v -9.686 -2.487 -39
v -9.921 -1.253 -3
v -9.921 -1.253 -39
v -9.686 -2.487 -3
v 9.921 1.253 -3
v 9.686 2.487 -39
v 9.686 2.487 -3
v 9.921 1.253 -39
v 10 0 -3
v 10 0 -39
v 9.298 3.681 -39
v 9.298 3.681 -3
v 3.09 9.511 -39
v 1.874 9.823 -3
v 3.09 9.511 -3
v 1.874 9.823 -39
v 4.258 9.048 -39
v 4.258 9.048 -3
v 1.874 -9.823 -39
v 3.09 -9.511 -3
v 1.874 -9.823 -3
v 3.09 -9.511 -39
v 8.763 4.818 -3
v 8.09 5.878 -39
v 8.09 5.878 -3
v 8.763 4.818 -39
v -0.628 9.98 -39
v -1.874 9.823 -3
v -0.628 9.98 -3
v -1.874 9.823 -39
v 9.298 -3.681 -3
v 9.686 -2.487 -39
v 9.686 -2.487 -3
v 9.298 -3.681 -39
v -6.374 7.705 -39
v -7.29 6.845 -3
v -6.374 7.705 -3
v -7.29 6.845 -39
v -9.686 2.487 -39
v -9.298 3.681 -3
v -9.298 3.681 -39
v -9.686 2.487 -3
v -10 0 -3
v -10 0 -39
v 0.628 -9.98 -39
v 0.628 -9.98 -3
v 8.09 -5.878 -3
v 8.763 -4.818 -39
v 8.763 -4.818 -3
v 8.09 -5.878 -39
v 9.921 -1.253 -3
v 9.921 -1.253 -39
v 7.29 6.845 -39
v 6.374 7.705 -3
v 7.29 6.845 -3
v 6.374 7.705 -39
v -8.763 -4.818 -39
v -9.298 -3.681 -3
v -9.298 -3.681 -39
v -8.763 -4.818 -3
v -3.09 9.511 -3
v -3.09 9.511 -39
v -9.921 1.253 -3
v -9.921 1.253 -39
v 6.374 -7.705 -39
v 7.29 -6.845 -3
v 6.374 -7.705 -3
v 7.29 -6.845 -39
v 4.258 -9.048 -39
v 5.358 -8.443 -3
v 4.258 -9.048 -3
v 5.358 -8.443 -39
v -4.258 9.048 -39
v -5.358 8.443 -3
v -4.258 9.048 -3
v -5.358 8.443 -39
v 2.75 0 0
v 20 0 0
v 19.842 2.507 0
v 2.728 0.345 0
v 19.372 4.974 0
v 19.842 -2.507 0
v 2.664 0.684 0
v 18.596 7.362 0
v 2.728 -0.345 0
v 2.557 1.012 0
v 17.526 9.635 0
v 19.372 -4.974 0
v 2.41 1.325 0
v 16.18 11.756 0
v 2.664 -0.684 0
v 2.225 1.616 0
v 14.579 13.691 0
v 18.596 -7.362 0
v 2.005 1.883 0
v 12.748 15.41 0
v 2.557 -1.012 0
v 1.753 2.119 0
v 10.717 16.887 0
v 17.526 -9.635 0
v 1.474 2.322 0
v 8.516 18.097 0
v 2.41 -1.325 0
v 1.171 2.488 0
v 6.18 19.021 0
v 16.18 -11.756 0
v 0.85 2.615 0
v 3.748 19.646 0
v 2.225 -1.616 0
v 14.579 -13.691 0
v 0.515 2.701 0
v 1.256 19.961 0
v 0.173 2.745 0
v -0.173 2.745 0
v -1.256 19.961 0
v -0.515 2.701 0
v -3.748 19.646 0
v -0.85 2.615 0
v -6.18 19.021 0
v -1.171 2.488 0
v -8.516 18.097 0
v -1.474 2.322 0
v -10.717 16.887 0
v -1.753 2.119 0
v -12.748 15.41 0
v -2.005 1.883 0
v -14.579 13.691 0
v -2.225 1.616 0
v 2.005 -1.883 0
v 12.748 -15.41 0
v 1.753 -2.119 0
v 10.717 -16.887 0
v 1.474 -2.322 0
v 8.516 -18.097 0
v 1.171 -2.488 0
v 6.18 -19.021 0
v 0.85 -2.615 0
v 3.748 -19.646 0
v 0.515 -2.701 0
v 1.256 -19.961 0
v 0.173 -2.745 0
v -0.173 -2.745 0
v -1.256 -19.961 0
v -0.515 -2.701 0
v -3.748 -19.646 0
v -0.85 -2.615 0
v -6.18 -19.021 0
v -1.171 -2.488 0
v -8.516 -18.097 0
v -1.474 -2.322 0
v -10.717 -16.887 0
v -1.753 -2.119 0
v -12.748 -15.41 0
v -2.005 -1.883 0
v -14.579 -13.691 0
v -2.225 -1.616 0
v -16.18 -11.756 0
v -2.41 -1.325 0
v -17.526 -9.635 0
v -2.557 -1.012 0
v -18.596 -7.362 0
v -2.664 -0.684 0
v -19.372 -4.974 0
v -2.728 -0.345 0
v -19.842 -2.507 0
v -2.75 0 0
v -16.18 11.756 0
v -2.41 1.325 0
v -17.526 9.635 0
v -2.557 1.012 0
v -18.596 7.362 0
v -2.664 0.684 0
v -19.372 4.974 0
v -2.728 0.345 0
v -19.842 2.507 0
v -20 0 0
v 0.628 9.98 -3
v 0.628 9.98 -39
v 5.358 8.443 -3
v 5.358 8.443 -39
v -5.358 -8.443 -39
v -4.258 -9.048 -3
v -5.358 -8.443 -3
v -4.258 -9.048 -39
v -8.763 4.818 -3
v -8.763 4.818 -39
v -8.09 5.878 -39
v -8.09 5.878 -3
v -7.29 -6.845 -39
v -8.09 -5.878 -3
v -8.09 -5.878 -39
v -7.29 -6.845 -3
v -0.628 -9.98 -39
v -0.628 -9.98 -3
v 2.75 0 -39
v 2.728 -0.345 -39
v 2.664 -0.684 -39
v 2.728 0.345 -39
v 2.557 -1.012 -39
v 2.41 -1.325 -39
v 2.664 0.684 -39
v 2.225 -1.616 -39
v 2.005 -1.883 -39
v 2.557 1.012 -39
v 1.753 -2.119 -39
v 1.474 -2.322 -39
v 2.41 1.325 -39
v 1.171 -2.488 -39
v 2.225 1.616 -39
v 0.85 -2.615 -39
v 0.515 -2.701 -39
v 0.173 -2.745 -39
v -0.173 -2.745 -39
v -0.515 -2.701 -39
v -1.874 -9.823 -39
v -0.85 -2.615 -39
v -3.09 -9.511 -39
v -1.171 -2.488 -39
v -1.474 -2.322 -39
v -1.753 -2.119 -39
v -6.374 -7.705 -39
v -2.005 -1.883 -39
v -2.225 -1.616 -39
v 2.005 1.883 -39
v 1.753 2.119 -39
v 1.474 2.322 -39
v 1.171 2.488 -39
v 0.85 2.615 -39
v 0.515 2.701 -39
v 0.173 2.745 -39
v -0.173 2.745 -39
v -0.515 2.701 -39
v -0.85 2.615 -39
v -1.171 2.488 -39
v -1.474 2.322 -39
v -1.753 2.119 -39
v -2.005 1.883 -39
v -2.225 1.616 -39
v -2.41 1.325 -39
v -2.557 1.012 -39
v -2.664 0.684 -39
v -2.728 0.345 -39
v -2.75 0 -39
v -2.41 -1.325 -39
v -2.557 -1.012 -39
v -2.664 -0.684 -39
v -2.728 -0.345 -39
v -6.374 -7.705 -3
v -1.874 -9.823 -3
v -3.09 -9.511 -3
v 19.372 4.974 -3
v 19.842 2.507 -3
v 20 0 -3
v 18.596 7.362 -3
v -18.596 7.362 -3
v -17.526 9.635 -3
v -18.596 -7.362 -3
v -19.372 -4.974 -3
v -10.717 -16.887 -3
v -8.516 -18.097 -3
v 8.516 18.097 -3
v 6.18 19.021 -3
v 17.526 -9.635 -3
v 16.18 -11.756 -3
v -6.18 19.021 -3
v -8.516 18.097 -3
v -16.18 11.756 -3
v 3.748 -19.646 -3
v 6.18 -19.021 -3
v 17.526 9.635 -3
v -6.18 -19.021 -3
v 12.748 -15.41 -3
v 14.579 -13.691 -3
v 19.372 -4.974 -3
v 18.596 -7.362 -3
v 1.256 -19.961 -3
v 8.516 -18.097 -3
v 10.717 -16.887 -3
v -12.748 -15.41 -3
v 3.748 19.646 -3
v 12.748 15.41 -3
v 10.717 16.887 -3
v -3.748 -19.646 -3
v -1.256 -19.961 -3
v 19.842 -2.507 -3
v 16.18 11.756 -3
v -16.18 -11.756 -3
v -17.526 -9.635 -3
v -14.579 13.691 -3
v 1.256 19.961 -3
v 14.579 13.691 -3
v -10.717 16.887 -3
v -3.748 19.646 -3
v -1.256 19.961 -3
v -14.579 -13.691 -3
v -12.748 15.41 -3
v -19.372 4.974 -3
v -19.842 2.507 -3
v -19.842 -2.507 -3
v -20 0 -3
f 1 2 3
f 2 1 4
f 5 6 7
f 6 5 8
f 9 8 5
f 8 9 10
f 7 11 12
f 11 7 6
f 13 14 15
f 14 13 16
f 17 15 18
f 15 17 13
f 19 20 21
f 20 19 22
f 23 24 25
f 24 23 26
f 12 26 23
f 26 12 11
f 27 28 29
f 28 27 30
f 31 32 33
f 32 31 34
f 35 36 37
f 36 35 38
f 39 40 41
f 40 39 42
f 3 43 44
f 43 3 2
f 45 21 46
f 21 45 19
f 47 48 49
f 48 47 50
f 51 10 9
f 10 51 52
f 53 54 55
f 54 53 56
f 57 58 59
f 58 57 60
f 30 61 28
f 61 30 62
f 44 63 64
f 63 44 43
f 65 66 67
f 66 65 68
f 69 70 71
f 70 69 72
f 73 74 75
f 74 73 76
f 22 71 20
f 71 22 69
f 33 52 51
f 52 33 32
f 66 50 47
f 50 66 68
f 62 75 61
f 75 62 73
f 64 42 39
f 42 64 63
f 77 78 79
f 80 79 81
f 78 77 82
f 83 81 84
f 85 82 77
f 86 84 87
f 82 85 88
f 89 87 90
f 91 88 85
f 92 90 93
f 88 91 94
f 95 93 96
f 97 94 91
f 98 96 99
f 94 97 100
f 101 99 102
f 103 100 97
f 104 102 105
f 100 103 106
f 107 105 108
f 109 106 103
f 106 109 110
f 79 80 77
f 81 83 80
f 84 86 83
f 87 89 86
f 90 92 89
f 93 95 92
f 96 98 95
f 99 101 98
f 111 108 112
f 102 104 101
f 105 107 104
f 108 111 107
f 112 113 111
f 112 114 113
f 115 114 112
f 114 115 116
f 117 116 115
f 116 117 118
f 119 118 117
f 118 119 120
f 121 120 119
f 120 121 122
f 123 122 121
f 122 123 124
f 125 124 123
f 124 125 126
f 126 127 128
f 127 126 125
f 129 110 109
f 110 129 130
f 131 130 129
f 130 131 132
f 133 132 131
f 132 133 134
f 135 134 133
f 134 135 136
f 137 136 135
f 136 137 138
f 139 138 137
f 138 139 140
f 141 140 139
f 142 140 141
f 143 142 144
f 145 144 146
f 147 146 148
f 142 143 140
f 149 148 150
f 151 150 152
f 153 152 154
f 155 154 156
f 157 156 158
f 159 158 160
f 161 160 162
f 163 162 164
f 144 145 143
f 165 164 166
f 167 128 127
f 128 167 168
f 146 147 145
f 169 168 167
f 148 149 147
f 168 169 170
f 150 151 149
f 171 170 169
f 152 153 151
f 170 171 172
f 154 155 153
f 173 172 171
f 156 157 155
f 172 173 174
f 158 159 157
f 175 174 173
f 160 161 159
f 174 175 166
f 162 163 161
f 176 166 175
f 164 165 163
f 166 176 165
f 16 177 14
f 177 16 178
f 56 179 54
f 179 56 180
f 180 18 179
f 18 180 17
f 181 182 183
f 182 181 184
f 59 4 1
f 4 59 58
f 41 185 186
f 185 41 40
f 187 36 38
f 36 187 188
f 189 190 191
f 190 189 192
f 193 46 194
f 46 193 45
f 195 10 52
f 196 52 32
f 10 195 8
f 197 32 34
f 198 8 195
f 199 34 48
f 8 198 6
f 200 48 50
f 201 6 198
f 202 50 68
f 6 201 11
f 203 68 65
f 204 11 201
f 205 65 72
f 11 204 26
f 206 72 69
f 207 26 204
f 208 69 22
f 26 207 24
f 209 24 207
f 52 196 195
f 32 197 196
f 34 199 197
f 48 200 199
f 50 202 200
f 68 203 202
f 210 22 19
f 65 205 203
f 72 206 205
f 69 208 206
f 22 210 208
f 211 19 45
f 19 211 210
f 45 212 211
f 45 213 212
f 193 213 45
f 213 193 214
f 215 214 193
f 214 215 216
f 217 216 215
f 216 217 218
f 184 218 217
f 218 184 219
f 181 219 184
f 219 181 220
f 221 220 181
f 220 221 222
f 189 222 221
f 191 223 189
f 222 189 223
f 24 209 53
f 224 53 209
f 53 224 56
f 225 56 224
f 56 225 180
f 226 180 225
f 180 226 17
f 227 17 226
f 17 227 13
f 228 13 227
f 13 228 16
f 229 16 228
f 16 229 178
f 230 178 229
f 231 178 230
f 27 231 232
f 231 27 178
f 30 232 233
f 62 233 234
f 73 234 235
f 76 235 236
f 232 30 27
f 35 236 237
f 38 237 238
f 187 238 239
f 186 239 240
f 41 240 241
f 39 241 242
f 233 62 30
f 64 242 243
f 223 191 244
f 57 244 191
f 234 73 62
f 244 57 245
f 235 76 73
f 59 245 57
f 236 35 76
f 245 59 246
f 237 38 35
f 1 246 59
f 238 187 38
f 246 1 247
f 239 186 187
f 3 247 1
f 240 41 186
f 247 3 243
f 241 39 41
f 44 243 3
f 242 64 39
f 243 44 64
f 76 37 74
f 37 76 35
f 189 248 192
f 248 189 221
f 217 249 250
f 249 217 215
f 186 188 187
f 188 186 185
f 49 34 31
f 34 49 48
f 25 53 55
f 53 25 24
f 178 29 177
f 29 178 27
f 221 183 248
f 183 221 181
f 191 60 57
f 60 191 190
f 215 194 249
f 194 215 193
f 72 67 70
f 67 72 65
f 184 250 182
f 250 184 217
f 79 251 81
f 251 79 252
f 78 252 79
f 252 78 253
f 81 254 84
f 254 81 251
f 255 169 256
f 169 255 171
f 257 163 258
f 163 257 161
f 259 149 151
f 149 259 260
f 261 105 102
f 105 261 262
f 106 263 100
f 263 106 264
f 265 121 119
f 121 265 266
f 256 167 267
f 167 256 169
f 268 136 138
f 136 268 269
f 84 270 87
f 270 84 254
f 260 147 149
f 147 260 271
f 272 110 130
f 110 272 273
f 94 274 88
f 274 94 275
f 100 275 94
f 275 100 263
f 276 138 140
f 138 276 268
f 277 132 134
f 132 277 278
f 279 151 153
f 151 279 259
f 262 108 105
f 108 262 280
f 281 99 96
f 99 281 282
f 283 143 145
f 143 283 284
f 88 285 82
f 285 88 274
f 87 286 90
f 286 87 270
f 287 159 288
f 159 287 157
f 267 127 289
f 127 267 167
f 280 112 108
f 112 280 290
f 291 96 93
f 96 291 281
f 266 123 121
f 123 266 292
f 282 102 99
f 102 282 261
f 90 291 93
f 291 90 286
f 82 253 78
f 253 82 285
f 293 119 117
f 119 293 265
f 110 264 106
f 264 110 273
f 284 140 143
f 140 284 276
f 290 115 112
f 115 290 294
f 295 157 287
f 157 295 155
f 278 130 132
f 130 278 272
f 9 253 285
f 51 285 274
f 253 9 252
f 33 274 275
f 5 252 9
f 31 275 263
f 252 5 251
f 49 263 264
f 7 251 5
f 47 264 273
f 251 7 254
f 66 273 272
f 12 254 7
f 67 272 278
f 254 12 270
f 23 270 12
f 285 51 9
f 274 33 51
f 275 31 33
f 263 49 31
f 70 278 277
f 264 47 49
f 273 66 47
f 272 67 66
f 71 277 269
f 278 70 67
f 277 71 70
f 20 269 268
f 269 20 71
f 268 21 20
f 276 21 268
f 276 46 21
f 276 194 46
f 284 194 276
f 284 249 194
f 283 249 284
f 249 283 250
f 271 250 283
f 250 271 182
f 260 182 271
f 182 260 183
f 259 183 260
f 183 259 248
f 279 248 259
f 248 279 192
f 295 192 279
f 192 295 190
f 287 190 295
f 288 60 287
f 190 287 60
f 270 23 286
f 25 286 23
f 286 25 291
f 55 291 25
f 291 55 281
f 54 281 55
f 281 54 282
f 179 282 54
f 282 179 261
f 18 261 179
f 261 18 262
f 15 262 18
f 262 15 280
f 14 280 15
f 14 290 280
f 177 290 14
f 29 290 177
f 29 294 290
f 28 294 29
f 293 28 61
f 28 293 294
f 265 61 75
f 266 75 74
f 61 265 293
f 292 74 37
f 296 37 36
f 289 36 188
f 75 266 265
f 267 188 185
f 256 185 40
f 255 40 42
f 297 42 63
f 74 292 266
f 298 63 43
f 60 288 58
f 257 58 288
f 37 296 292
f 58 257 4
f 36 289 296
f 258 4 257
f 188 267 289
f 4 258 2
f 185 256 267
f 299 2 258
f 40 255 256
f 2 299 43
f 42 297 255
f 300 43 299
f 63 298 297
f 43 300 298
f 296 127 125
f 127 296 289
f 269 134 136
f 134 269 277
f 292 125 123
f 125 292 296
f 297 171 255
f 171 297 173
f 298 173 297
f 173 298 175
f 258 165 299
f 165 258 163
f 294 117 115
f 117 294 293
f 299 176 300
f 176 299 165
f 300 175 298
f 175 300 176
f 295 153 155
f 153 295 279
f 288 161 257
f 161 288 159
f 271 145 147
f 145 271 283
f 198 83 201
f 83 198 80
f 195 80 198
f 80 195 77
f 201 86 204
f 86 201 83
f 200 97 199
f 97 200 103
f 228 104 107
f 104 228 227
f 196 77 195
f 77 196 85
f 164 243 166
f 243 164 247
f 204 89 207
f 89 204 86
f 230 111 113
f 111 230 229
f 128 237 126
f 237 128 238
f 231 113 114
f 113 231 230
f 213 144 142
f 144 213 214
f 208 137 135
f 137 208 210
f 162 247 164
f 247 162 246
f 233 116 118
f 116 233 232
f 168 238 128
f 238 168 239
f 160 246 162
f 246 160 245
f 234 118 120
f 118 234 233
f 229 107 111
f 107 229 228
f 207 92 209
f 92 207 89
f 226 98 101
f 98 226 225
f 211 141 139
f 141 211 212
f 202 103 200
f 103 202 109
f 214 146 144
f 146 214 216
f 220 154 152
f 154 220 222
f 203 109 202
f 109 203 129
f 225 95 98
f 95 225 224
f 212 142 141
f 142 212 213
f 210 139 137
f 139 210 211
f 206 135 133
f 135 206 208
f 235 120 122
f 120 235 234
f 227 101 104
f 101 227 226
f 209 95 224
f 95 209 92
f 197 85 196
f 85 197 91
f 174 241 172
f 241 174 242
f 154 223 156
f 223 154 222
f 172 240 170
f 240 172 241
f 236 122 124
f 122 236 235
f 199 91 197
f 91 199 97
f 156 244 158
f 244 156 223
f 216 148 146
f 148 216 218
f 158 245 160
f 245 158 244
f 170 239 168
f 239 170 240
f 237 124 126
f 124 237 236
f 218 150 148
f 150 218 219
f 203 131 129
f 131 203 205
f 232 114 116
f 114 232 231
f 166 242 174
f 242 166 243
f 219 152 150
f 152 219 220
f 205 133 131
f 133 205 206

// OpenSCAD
$fn = 50;


difference() {
	union() {
		translate(v = [0, 0, -39.0000000000]) {
			cylinder(h = 39, r = 10.0000000000);
		}
		translate(v = [0, 0, -3.0000000000]) {
			cylinder(h = 3, r = 20.0000000000);
		}
	}
	union() {
		#translate(v = [0, 0, -39]) {
			cylinder(h = 39, r = 2.7500000000);
		}
	}
}
